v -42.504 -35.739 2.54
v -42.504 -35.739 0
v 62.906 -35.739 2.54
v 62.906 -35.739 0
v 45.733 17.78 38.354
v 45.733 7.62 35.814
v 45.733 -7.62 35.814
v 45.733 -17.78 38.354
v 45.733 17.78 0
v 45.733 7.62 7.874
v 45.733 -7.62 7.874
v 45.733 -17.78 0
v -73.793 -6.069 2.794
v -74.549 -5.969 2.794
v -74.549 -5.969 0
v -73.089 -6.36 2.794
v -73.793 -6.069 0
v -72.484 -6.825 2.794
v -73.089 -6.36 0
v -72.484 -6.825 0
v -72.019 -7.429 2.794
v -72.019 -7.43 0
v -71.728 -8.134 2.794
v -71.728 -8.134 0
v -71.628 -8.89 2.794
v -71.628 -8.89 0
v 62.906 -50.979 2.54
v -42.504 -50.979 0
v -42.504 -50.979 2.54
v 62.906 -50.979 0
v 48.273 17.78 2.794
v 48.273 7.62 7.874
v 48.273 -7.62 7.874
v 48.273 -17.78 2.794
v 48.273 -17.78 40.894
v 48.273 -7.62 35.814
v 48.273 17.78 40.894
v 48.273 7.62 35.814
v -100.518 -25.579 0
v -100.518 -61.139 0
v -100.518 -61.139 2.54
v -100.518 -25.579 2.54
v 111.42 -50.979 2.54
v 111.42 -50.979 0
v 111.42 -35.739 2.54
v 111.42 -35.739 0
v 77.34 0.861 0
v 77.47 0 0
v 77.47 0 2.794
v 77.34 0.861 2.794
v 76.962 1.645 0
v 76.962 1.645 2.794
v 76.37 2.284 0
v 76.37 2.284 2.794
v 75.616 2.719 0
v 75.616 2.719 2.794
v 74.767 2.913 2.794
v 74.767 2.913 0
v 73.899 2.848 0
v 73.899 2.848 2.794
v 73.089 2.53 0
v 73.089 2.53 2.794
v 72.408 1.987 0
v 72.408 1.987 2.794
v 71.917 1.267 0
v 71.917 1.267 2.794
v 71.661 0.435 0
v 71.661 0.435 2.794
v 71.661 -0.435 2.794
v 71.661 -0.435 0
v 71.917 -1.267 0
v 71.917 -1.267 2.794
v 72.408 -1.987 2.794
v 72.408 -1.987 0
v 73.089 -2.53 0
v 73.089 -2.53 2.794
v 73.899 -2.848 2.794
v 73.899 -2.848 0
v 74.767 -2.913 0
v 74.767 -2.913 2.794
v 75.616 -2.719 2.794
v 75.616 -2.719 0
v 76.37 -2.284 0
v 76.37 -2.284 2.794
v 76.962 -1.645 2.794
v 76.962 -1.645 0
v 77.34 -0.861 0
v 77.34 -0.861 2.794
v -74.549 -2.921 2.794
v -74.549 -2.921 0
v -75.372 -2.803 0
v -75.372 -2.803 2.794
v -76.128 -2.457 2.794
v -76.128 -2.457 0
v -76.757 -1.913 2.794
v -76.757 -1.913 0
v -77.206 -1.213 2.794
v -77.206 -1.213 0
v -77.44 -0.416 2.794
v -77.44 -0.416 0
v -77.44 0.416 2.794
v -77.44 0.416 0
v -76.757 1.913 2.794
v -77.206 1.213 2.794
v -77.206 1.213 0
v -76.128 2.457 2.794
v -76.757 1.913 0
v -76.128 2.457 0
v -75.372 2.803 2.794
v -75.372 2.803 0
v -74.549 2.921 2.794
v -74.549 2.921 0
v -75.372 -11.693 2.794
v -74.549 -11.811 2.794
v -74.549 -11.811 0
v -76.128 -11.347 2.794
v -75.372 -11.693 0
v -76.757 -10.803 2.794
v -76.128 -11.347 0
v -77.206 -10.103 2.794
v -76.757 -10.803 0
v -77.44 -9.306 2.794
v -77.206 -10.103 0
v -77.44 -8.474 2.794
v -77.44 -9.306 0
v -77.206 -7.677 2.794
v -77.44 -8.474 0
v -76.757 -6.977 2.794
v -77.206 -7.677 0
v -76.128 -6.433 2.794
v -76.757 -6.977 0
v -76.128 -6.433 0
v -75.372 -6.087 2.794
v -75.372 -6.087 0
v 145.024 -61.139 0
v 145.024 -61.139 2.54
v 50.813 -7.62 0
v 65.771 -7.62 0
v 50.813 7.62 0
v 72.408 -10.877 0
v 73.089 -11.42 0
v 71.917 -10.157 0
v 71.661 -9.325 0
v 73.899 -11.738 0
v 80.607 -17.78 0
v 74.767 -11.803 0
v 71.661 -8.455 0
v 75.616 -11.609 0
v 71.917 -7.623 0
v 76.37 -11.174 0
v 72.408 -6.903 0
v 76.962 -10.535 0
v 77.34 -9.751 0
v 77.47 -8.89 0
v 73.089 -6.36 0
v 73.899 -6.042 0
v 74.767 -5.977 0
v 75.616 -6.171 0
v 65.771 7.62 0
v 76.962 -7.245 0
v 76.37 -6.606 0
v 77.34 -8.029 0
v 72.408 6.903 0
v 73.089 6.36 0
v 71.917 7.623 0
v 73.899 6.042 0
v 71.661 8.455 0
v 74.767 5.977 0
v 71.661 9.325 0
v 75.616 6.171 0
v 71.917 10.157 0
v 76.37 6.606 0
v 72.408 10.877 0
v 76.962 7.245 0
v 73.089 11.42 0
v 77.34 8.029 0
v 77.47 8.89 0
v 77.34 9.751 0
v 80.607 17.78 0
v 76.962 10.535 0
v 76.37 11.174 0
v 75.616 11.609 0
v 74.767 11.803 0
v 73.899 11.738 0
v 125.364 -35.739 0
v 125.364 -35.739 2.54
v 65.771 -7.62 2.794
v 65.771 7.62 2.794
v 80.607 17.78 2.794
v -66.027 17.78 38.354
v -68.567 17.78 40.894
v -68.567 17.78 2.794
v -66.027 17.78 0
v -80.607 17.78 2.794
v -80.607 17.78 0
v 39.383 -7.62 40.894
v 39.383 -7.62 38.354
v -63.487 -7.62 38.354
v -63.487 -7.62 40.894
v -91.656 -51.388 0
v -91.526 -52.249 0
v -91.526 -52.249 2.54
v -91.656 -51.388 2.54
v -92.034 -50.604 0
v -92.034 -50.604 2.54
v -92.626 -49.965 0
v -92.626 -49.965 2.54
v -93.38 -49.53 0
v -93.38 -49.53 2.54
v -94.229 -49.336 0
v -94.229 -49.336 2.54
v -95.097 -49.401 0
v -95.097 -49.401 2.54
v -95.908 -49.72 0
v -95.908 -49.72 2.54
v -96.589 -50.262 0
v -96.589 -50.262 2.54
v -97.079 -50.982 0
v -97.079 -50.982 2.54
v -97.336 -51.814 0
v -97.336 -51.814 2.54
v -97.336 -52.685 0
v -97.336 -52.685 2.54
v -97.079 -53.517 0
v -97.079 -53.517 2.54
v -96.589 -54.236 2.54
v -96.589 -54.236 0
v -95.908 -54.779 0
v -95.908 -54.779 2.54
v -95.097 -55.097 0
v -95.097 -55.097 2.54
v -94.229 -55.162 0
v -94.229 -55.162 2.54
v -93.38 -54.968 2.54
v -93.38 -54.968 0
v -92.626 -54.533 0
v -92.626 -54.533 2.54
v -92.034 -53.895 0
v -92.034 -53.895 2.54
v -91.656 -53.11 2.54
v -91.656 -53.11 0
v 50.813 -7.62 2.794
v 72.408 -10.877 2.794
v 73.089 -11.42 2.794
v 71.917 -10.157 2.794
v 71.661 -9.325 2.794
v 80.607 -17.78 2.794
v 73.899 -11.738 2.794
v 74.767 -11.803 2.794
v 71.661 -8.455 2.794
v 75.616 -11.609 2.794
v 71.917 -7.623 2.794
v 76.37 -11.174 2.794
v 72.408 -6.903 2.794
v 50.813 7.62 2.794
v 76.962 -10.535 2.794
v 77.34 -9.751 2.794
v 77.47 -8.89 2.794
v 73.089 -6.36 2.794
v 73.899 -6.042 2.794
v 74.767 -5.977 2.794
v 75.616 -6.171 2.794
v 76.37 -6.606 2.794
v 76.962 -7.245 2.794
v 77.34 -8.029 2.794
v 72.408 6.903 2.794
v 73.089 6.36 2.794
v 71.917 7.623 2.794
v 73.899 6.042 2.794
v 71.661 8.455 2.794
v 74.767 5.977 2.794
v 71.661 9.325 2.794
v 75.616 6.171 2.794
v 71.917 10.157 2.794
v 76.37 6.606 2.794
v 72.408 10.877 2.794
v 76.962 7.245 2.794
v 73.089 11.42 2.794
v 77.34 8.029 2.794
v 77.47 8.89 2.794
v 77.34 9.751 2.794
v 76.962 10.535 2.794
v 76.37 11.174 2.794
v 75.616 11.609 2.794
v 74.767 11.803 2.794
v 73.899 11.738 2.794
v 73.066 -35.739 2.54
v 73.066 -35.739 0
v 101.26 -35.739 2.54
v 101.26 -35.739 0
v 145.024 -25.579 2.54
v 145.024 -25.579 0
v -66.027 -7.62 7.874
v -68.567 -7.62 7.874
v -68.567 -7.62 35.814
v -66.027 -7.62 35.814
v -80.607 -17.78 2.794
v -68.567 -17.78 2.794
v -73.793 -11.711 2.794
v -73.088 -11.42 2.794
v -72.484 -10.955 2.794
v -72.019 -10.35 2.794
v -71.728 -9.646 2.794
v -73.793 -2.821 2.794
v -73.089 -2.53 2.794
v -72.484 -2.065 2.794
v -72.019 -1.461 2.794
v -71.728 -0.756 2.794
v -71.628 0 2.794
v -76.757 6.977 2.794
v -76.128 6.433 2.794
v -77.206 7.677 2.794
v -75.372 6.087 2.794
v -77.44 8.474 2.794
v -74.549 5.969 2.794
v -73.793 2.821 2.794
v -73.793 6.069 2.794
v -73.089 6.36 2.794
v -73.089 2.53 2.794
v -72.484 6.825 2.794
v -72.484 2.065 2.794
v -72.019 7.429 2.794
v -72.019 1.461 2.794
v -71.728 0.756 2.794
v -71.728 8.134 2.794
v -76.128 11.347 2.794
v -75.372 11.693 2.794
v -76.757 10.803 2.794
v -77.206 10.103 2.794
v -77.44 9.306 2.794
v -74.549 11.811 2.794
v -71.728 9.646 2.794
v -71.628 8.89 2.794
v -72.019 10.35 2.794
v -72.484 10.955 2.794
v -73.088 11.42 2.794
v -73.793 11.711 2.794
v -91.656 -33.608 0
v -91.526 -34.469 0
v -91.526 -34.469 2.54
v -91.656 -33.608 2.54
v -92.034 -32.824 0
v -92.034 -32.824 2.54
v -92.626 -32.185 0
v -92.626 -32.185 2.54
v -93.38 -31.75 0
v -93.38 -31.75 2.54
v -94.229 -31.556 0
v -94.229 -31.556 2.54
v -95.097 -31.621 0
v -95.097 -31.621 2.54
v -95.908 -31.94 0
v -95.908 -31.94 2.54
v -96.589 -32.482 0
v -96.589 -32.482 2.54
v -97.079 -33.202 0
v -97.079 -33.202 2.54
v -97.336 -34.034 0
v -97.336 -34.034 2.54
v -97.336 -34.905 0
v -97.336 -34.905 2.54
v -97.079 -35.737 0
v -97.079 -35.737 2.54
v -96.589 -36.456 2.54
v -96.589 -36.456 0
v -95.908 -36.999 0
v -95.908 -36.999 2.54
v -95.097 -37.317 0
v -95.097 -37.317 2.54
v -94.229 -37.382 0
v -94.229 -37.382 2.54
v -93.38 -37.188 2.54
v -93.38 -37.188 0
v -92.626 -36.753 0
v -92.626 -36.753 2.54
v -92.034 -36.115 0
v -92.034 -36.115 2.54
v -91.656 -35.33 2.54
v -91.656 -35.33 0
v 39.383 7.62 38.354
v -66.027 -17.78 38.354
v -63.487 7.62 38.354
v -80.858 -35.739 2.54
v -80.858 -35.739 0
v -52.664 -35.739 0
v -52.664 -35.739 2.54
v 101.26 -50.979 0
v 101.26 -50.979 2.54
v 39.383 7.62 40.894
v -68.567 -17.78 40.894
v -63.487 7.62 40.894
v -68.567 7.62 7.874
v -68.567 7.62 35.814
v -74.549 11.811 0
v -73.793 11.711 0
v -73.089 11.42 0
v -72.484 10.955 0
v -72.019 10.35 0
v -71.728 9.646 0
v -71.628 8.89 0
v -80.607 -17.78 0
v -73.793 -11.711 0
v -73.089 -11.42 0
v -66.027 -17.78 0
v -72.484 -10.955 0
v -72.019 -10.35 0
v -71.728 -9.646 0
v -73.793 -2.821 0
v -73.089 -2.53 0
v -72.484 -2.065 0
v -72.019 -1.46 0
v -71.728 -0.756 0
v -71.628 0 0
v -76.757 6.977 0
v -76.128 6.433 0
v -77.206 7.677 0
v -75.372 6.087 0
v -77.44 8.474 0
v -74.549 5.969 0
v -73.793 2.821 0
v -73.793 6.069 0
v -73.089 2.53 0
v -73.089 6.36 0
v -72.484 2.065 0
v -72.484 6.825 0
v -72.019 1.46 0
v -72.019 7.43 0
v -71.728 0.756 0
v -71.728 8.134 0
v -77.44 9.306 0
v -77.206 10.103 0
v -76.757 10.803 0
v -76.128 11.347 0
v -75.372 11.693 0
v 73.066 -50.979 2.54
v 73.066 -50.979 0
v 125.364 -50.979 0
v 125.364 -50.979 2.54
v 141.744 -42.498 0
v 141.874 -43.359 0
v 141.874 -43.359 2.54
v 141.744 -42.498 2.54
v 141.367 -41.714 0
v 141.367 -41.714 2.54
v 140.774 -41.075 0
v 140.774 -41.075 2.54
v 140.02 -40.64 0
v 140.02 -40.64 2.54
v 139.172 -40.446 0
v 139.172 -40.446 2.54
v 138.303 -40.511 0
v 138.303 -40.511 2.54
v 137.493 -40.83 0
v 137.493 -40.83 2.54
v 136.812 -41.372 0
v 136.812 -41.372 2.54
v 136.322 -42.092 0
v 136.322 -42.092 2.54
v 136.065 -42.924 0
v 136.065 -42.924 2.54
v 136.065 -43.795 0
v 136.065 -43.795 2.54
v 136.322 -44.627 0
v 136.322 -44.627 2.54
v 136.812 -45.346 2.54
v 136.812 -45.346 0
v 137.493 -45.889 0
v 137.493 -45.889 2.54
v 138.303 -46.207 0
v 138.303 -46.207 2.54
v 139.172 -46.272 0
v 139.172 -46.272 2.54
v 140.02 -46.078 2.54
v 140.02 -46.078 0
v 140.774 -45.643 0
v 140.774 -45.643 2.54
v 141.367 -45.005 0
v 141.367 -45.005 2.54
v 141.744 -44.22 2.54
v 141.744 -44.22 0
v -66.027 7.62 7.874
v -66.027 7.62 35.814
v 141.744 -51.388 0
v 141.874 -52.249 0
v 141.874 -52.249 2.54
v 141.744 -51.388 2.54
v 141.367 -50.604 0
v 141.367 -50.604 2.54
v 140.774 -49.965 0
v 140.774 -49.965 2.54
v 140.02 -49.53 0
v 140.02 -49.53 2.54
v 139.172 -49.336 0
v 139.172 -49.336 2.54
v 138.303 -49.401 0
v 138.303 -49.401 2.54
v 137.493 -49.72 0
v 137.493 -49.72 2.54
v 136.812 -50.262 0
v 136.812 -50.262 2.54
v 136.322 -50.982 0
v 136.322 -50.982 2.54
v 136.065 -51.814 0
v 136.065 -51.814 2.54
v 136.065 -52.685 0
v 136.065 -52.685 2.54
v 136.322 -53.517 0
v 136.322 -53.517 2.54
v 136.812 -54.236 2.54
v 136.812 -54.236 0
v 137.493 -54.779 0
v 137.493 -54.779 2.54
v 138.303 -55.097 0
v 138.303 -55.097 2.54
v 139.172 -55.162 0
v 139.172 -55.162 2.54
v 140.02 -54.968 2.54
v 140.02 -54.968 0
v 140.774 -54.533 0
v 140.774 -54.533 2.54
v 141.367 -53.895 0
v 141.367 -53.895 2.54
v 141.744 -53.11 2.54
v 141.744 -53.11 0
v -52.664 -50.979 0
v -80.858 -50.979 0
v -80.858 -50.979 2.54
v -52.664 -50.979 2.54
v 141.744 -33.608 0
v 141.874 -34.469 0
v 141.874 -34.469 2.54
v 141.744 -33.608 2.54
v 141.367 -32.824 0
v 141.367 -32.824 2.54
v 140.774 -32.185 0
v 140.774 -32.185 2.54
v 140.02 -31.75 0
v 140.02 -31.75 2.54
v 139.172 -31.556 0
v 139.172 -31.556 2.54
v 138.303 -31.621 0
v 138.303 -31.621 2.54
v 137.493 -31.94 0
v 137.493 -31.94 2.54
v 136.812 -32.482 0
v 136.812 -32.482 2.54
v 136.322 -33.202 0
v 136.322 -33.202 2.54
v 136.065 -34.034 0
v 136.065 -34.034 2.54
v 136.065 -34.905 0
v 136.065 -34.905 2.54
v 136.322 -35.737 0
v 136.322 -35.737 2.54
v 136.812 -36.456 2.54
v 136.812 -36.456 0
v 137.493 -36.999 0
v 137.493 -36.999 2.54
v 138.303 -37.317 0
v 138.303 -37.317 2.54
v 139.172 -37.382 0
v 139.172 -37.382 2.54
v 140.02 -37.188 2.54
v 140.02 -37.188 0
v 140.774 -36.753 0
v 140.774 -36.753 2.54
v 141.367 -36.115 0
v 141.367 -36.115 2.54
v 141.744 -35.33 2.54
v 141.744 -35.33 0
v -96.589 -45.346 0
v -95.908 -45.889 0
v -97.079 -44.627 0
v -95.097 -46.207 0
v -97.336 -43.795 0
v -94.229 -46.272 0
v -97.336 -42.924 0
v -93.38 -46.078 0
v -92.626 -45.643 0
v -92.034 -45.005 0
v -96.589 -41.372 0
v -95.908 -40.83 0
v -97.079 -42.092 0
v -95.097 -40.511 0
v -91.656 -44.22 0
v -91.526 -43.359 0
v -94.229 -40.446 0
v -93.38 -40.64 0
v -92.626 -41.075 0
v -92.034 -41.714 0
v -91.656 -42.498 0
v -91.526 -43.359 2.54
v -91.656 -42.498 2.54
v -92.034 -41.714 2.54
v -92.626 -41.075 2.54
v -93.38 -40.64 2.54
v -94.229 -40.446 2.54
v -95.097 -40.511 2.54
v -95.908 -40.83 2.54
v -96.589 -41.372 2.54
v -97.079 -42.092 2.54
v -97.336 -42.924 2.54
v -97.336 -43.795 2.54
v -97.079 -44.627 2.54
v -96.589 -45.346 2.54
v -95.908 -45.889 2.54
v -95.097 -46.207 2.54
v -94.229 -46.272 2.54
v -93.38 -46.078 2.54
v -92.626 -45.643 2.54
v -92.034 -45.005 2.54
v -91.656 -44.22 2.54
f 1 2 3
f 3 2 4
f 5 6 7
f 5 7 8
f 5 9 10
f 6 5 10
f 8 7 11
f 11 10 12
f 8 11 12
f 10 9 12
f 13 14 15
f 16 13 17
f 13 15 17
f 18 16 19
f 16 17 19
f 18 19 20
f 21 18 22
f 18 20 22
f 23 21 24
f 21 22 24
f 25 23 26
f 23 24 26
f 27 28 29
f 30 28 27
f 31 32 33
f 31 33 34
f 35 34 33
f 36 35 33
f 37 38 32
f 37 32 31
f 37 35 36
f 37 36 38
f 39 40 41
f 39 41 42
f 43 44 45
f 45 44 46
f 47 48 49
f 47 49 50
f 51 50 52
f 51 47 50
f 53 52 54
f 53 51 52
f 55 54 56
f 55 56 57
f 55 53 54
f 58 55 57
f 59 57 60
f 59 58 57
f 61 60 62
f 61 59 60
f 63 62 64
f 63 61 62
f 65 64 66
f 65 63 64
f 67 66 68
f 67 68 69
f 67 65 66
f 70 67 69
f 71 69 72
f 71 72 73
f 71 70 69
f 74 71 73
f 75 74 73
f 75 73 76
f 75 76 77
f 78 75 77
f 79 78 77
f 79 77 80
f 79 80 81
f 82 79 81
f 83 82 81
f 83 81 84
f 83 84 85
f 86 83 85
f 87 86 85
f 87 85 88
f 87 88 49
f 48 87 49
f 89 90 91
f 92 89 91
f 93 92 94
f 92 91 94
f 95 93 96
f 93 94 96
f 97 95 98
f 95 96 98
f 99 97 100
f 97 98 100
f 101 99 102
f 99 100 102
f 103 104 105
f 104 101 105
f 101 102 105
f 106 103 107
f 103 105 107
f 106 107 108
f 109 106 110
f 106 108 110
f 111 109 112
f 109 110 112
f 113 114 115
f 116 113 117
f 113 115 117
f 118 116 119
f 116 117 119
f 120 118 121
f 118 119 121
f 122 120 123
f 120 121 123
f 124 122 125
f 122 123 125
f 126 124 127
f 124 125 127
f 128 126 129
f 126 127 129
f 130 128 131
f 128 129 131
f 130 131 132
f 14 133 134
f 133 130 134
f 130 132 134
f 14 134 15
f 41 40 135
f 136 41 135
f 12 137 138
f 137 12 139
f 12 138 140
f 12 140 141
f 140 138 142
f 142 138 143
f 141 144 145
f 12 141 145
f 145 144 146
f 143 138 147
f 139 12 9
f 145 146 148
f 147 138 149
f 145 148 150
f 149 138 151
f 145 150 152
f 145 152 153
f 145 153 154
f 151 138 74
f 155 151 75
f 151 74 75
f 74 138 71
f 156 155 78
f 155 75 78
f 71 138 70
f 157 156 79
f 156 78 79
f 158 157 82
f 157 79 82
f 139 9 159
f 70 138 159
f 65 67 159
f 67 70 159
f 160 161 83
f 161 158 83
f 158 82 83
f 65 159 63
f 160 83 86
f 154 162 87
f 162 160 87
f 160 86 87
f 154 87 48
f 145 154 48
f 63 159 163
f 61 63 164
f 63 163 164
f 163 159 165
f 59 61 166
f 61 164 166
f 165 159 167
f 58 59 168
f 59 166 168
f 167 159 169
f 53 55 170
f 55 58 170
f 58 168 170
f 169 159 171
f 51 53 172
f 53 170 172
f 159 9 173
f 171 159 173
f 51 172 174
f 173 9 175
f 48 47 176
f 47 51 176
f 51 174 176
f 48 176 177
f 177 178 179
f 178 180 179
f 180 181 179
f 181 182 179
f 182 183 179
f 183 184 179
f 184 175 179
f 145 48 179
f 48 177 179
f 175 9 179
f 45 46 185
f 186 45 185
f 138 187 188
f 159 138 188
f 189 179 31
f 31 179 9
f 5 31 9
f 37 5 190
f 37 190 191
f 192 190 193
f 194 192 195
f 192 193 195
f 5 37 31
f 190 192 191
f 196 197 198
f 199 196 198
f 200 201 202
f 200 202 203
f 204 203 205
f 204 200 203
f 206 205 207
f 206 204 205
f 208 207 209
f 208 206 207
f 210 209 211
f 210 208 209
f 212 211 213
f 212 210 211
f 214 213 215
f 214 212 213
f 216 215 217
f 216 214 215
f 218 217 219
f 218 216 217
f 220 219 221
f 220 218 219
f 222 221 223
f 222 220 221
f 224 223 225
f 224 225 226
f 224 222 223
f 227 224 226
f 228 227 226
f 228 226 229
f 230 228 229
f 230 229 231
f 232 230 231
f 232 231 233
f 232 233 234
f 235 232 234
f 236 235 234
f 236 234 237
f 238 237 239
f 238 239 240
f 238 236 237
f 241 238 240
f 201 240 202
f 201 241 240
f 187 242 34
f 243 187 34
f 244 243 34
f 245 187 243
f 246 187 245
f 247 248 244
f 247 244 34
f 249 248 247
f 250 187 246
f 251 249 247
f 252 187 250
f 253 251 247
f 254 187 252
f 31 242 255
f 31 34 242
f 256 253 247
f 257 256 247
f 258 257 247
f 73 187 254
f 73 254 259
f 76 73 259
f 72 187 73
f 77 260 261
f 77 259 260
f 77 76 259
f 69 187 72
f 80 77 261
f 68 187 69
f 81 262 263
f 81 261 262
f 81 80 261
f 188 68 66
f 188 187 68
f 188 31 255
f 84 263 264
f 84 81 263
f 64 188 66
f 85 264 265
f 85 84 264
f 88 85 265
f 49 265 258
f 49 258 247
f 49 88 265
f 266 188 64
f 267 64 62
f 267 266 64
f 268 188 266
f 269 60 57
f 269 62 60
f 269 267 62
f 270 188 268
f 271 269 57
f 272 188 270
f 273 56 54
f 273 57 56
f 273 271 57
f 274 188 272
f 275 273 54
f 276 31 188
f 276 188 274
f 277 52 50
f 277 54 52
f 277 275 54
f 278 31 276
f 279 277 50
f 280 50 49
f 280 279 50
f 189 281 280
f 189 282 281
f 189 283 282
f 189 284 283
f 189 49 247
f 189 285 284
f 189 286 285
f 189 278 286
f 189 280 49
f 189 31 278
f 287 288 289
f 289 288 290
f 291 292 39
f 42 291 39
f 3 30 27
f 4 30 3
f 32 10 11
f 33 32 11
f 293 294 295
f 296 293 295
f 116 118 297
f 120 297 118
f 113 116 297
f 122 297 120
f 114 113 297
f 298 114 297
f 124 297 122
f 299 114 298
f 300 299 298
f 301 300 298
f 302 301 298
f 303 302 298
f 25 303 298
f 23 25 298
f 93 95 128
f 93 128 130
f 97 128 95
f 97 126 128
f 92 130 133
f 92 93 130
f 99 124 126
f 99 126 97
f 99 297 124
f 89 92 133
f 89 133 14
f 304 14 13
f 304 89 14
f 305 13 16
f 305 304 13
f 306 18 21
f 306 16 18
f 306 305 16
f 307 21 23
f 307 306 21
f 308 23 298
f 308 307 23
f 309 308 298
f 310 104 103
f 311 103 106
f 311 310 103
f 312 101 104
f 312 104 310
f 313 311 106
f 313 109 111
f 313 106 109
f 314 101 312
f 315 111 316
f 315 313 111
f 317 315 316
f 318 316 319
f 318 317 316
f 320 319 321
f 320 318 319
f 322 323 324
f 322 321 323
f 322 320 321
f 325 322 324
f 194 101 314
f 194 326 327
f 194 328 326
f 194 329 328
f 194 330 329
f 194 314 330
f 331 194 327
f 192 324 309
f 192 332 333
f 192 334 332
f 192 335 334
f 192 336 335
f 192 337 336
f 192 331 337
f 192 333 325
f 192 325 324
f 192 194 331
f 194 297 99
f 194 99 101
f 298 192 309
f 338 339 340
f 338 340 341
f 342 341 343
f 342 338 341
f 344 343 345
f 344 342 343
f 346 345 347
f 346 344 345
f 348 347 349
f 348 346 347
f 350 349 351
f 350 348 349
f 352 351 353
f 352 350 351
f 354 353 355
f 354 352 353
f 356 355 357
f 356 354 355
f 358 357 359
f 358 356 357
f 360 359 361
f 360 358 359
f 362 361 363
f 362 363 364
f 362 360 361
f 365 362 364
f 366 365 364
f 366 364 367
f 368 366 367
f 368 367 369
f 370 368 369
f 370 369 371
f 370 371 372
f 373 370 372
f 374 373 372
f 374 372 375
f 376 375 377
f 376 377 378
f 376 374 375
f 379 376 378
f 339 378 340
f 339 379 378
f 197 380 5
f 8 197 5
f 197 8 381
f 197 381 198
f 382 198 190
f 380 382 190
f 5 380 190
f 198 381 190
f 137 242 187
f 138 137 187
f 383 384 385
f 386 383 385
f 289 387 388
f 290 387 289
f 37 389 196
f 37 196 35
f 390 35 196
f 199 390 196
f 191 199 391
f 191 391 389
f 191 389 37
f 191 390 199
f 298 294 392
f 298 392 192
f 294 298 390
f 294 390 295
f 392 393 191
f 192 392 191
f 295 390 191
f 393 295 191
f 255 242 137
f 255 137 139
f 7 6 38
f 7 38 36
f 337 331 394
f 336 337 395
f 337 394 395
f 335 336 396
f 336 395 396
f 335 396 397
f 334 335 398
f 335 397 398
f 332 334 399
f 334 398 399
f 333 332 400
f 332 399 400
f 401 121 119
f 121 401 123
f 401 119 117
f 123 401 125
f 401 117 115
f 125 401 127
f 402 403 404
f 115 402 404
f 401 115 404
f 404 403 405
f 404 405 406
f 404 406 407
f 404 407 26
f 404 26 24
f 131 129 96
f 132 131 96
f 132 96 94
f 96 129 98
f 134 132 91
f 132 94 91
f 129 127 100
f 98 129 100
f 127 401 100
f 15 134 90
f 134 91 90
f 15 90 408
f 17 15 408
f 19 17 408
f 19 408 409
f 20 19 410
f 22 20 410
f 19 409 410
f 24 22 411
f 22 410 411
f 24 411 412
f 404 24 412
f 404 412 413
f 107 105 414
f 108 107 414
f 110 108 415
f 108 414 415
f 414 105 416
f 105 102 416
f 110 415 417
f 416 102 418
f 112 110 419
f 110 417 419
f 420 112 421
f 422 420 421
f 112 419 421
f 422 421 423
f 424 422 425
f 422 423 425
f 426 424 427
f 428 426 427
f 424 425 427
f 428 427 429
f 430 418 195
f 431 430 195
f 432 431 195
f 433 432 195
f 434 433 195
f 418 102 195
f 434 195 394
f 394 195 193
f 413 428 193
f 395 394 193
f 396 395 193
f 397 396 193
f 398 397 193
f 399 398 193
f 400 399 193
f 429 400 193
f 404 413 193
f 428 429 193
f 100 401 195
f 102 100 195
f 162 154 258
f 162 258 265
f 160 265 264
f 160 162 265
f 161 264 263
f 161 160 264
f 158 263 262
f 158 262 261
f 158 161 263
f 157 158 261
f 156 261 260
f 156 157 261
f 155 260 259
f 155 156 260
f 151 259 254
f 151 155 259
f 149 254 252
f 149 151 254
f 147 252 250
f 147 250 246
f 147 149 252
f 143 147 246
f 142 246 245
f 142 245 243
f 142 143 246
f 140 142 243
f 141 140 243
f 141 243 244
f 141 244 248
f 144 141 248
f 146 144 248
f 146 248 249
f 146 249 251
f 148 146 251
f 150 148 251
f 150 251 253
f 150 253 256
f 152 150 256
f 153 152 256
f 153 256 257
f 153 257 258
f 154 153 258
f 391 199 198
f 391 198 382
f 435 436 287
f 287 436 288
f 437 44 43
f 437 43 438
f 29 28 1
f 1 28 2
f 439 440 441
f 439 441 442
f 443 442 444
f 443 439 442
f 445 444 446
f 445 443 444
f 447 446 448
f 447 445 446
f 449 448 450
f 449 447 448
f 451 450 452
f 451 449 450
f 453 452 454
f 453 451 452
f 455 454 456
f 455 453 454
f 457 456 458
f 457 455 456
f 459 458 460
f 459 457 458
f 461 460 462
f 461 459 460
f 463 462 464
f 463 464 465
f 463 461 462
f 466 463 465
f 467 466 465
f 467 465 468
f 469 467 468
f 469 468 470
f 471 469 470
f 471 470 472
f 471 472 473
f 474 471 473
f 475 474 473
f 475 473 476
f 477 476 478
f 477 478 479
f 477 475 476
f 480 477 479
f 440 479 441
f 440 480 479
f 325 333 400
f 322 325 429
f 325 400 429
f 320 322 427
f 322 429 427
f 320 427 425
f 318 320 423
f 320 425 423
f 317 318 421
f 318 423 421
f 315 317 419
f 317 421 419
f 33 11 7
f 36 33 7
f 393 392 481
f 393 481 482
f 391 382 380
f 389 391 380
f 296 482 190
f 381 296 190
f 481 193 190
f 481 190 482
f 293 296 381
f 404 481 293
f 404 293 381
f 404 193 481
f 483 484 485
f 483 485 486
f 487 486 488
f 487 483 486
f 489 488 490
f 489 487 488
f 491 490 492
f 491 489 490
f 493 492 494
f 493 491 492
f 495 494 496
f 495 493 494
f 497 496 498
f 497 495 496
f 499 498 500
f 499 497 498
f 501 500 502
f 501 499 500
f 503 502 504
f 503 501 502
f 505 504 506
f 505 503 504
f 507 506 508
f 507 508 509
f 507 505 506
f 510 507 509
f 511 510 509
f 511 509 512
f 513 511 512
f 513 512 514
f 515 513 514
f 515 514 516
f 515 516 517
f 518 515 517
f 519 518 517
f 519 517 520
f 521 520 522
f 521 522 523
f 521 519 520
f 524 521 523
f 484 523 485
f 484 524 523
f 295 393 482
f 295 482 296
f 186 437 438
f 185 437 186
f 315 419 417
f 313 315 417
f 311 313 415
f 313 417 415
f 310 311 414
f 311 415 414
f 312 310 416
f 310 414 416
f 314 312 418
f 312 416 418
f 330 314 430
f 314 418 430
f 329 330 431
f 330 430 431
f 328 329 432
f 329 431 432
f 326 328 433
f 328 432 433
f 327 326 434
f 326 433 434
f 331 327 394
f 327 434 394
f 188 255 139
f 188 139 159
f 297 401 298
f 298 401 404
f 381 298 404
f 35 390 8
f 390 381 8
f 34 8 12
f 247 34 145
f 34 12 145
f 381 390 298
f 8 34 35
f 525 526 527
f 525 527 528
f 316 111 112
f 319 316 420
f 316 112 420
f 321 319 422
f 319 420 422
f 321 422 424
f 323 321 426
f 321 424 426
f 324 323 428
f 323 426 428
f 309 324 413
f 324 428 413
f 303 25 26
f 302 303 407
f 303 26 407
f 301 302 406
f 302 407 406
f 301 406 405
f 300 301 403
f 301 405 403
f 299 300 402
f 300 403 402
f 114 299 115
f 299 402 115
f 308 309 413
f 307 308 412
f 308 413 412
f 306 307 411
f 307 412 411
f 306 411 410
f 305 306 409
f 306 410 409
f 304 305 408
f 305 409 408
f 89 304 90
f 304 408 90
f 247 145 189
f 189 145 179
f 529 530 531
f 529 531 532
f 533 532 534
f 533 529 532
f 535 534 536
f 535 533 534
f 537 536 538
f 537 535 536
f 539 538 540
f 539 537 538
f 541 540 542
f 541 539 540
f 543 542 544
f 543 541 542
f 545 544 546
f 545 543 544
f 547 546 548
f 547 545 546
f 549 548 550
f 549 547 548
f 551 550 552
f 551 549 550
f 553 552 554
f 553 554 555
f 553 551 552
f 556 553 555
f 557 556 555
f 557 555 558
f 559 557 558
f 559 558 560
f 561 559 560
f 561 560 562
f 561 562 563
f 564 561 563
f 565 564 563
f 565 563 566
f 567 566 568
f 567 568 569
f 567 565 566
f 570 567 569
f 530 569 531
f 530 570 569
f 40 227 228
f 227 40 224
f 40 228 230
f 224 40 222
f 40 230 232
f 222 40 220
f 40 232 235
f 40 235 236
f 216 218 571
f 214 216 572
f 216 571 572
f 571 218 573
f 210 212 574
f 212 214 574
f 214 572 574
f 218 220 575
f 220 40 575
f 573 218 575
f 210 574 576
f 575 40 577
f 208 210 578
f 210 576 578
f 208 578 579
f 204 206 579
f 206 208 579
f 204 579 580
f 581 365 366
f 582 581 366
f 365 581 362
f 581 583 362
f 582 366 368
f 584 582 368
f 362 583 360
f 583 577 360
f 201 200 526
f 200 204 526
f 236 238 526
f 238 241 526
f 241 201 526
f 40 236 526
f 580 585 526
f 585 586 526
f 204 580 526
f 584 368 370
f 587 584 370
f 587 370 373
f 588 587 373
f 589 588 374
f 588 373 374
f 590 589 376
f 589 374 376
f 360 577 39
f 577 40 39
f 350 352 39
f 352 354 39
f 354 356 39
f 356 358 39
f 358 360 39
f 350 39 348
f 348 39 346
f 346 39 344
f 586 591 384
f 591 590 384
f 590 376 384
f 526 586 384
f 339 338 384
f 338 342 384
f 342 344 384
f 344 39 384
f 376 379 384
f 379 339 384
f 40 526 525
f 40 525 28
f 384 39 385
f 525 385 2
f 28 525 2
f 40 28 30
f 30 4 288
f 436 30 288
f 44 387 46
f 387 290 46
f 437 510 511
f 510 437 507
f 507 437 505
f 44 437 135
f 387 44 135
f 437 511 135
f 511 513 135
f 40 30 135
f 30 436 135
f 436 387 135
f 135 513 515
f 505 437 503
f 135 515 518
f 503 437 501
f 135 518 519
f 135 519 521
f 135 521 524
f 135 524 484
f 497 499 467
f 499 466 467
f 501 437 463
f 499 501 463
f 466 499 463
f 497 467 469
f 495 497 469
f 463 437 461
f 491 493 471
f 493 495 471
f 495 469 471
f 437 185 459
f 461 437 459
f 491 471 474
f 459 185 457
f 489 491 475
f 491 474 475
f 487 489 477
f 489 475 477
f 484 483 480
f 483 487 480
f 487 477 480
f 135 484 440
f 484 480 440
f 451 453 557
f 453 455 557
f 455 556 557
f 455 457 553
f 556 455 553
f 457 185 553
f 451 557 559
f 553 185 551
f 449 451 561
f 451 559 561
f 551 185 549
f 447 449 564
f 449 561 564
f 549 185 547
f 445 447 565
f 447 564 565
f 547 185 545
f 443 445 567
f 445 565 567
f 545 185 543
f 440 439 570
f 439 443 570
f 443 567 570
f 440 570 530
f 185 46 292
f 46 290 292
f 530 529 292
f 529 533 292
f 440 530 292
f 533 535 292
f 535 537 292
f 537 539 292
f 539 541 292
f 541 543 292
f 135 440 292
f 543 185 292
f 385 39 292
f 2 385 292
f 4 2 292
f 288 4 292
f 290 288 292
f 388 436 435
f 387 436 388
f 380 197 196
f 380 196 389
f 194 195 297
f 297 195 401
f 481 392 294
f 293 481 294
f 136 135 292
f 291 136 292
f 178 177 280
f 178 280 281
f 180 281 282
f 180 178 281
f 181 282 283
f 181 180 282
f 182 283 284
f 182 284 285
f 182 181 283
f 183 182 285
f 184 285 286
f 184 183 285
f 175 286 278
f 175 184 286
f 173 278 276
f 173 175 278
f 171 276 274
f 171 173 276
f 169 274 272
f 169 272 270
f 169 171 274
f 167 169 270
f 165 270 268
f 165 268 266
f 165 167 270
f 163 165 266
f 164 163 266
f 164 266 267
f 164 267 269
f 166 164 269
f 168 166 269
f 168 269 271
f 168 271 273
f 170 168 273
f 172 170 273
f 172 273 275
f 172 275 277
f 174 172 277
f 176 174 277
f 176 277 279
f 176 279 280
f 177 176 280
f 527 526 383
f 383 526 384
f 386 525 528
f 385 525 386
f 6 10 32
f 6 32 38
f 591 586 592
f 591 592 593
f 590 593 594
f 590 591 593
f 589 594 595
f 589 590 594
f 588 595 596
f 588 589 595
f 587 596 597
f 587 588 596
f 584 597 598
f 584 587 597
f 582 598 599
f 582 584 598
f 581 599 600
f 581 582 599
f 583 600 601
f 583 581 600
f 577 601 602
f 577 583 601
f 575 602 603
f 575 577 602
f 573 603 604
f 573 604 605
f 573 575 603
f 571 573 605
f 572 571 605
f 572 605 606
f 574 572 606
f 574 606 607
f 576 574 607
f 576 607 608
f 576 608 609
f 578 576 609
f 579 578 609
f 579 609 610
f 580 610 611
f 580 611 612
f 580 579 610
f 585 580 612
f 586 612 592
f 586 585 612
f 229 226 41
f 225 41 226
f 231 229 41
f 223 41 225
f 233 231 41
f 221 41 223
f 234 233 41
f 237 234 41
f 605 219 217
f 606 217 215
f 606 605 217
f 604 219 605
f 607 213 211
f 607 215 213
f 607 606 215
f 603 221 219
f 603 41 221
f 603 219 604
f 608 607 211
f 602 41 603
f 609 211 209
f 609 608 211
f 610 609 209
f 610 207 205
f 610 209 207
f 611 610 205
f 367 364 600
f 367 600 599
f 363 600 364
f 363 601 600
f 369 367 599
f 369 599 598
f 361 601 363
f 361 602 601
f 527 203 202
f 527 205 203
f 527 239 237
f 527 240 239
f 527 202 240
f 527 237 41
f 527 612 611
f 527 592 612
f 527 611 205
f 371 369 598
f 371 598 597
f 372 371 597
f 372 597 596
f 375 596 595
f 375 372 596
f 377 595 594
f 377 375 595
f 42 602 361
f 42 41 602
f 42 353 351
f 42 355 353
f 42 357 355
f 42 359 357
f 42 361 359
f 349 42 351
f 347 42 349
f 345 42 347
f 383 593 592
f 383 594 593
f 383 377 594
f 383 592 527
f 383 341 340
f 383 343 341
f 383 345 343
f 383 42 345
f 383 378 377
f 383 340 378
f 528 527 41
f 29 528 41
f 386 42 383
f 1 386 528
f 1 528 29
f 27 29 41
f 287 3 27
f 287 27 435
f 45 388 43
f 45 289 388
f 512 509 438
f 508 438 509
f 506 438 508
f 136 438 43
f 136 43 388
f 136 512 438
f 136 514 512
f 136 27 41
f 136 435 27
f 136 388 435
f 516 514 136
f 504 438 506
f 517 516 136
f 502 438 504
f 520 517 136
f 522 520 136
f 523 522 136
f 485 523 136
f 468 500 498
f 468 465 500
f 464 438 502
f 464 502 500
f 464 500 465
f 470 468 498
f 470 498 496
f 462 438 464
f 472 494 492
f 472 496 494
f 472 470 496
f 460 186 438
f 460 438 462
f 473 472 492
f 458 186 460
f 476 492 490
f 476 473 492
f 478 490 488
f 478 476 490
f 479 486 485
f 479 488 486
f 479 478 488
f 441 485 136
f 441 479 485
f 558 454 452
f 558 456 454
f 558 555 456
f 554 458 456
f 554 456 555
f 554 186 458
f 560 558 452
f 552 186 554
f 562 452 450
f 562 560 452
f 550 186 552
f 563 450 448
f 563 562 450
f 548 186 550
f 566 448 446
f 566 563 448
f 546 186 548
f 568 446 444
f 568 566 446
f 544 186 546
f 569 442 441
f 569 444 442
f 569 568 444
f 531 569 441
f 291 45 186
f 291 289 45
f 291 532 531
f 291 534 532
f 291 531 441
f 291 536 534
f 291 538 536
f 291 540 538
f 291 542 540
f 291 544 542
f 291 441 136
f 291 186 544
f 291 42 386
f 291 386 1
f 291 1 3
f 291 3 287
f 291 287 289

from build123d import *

# Parameters (mm, degrees)
F0_W      = 105.41
F0_H      = 10.16
F0_W_2    = 26.6446
F0_H_2    = 15.24
F0_R      = 2.921
F1_DEPTH  = 40.894
F2_W      = 12.0396
F2_H      = 35.56
F2_R      = 2.921
F2_W_2    = 32.3342
F3_DEPTH  = 38.1
F4_W      = 105.41
F4_H      = 10.16
F4_W_2    = 1.27
F4_H_2    = 35.56
F5_DEPTH  = 38.354
F6_W      = 15.24
F6_H      = 27.94
F7_DEPTH  = 149.1752
F8_W      = 14.9580658293
F8_H      = 15.24
F9_DEPTH  = 5.08
F10_W     = 14.5796
F10_H     = 35.56
F10_R     = 2.921
F10_W_2   = 38.354
F10_W_3   = 28.194
F10_H_2   = 15.24
F10_W_4   = 115.57
F10_W_5   = 105.41
F10_W_6   = 24.1046
F10_W_7   = 13.9446
F11_DEPTH = 2.54
F12_W     = 15.24
F12_H     = 2.54
F13_DEPTH = 2.54


with BuildPart() as f1:
    # F0 (on Top) → F1 (new body)
    with BuildSketch(Plane.XY):
        with Locations((-13.3223, 12.7)):
            Rectangle(F0_W, F0_H)
        with BuildLine():
            Line((-66.0273, 7.62), (-66.0273, 17.78))
            Line((-66.0273, 17.78), (-74.549, 17.78))
            Line((-74.549, 17.78), (-74.549, 11.811))
            ThreePointArc((-74.549, 11.811), (-72.4835410922, 10.9554589078), (-71.628, 8.89))
            ThreePointArc((-71.628, 8.89), (-72.4835410922, 6.8245410922), (-74.549, 5.969))
            Line((-74.549, 5.969), (-74.549, 2.921))
            ThreePointArc((-74.549, 2.921), (-72.4835410922, 2.0654589078), (-71.628, 0))
            ThreePointArc((-71.628, 0), (-72.4835410922, -2.0654589078), (-74.549, -2.921))
            Line((-74.549, -2.921), (-74.549, -5.969))
            ThreePointArc((-74.549, -5.969), (-72.4835410922, -6.8245410922), (-71.628, -8.89))
            ThreePointArc((-71.628, -8.89), (-72.4835410922, -10.9554589078), (-74.549, -11.811))
            Line((-74.549, -11.811), (-74.549, -17.78))
            Line((-74.549, -17.78), (-66.0273, -17.78))
            Line((-66.0273, -17.78), (-66.0273, -7.62))
            Line((-66.0273, -7.62), (-66.0273, 7.62))
        make_face()
        with Locations((-13.3223, -12.7)):
            Rectangle(F0_W, F0_H)
        with Locations((52.705, -12.7)):
            Rectangle(F0_W_2, F0_H)
        with Locations((52.705, 12.7)):
            Rectangle(F0_W_2, F0_H)
        with Locations((52.705, 0)):
            Rectangle(F0_W_2, F0_H_2)
        Polygon((80.6069, -17.78), (80.6069, 17.78), (66.0273, 17.78), (66.0273, 7.62), (66.0273, -7.62), (66.0273, -17.78), align=None)
        with Locations((74.549, -8.89)):
            Circle(F0_R, mode=Mode.SUBTRACT)
        with Locations((74.549, 0)):
            Circle(F0_R, mode=Mode.SUBTRACT)
        with Locations((74.549, 8.89)):
            Circle(F0_R, mode=Mode.SUBTRACT)
        with BuildLine():
            Line((-74.549, 11.811), (-74.549, 17.78))
            Line((-74.549, 17.78), (-80.6069, 17.78))
            Line((-80.6069, 17.78), (-80.6069, 0))
            Line((-80.6069, 0), (-80.6069, -8.89))
            Line((-80.6069, -8.89), (-80.6069, -17.78))
            Line((-80.6069, -17.78), (-74.549, -17.78))
            Line((-74.549, -17.78), (-74.549, -11.811))
            ThreePointArc((-74.549, -11.811), (-77.47, -8.89), (-74.549, -5.969))
            Line((-74.549, -5.969), (-74.549, -2.921))
            ThreePointArc((-74.549, -2.921), (-77.47, 0), (-74.549, 2.921))
            Line((-74.549, 2.921), (-74.549, 5.969))
            ThreePointArc((-74.549, 5.969), (-77.47, 8.89), (-74.549, 11.811))
        make_face()
    extrude(amount=F1_DEPTH)

    # F2 (on face) → F3 (cut)
    with BuildSketch(Plane.XY.offset(40.894)):
        with Locations((-74.5871, 0)):
            Rectangle(F2_W, F2_H)
        with Locations((-74.549, -8.89)):
            Circle(F2_R, mode=Mode.SUBTRACT)
        with Locations((-74.549, 0)):
            Circle(F2_R, mode=Mode.SUBTRACT)
        with Locations((-74.549, 8.89)):
            Circle(F2_R, mode=Mode.SUBTRACT)
        with Locations((64.4398, 0)):
            Rectangle(F2_W_2, F2_H)
        with Locations((74.549, -8.89)):
            Circle(F2_R, mode=Mode.SUBTRACT)
        with Locations((74.549, 0)):
            Circle(F2_R, mode=Mode.SUBTRACT)
        with Locations((74.549, 8.89)):
            Circle(F2_R, mode=Mode.SUBTRACT)
    extrude(amount=-F3_DEPTH, mode=Mode.SUBTRACT)

    # F4 (on face) → F5 (cut)
    with BuildSketch(Plane(origin=(0, 0, 0), x_dir=(1, 0, 0), z_dir=(0, 0, -1))):
        with Locations((-13.3223, 12.7)):
            Rectangle(F4_W, F4_H)
        with Locations((-13.3223, -12.7)):
            Rectangle(F4_W, F4_H)
        Polygon((39.3827, 17.78), (39.3827, 7.62), (39.3827, -7.62), (39.3827, -17.78), (44.4627, -17.78), (44.4627, 17.78), align=None)
        with Locations((45.0977, 0)):
            Rectangle(F4_W_2, F4_H_2)
    extrude(amount=-F5_DEPTH, mode=Mode.SUBTRACT)

    # F6 (on face) → F7 (cut, through all)
    with BuildSketch(Plane(origin=(-68.5673, 0, 0), x_dir=(0, -1, 0), z_dir=(-1, 0, 0))):
        with Locations((0, 21.844)):
            Rectangle(F6_W, F6_H)
    extrude(amount=-F7_DEPTH, mode=Mode.SUBTRACT)

    # F8 (on face) → F9 (cut)
    with BuildSketch(Plane.XY.offset(2.794)):
        with Locations((58.2917329146, 0)):
            Rectangle(F8_W, F8_H)
    extrude(amount=-F9_DEPTH, mode=Mode.SUBTRACT)

    # F12 (on face) → F13 (join)
    with BuildSketch(Plane.YZ.offset(-66.0273)):
        with Locations((0, 39.624)):
            Rectangle(F12_W, F12_H)
    extrude(amount=F13_DEPTH)


with BuildPart() as f11:
    # F10 (on Top) → F11 (new body)
    with BuildSketch(Plane.XY):
        with Locations((-93.2281401838, -43.3592097834)):
            Rectangle(F10_W, F10_H)
        with Locations((-94.4473401838, -52.2492097834)):
            Circle(F10_R, mode=Mode.SUBTRACT)
        with Locations((-94.4473401838, -43.3592097834)):
            Circle(F10_R, mode=Mode.SUBTRACT)
        with Locations((-94.4473401838, -34.4692097834)):
            Circle(F10_R, mode=Mode.SUBTRACT)
        with Locations((-66.7613401838, -43.3592097834)):
            Rectangle(F10_W_2, F10_H)
        with Locations((-66.7613401838, -43.3592097834)):
            Rectangle(F10_W_3, F10_H_2, mode=Mode.SUBTRACT)
        with Locations((10.2006598162, -43.3592097834)):
            Rectangle(F10_W_4, F10_H)
        with Locations((10.2006598162, -43.3592097834)):
            Rectangle(F10_W_5, F10_H_2, mode=Mode.SUBTRACT)
        with Locations((87.1626598162, -43.3592097834)):
            Rectangle(F10_W_2, F10_H)
        with Locations((87.1626598162, -43.3592097834)):
            Rectangle(F10_W_3, F10_H_2, mode=Mode.SUBTRACT)
        with Locations((118.3919598162, -43.3592097834)):
            Rectangle(F10_W_6, F10_H)
        with Locations((118.3919598162, -43.3592097834)):
            Rectangle(F10_W_7, F10_H_2, mode=Mode.SUBTRACT)
        with Locations((137.7340598162, -43.3592097834)):
            Rectangle(F10_W, F10_H)
        with Locations((138.9532598162, -52.2492097834)):
            Circle(F10_R, mode=Mode.SUBTRACT)
        with Locations((138.9532598162, -43.3592097834)):
            Circle(F10_R, mode=Mode.SUBTRACT)
        with Locations((138.9532598162, -34.4692097834)):
            Circle(F10_R, mode=Mode.SUBTRACT)
    extrude(amount=F11_DEPTH)


solid = Compound([f1.part, f11.part])
